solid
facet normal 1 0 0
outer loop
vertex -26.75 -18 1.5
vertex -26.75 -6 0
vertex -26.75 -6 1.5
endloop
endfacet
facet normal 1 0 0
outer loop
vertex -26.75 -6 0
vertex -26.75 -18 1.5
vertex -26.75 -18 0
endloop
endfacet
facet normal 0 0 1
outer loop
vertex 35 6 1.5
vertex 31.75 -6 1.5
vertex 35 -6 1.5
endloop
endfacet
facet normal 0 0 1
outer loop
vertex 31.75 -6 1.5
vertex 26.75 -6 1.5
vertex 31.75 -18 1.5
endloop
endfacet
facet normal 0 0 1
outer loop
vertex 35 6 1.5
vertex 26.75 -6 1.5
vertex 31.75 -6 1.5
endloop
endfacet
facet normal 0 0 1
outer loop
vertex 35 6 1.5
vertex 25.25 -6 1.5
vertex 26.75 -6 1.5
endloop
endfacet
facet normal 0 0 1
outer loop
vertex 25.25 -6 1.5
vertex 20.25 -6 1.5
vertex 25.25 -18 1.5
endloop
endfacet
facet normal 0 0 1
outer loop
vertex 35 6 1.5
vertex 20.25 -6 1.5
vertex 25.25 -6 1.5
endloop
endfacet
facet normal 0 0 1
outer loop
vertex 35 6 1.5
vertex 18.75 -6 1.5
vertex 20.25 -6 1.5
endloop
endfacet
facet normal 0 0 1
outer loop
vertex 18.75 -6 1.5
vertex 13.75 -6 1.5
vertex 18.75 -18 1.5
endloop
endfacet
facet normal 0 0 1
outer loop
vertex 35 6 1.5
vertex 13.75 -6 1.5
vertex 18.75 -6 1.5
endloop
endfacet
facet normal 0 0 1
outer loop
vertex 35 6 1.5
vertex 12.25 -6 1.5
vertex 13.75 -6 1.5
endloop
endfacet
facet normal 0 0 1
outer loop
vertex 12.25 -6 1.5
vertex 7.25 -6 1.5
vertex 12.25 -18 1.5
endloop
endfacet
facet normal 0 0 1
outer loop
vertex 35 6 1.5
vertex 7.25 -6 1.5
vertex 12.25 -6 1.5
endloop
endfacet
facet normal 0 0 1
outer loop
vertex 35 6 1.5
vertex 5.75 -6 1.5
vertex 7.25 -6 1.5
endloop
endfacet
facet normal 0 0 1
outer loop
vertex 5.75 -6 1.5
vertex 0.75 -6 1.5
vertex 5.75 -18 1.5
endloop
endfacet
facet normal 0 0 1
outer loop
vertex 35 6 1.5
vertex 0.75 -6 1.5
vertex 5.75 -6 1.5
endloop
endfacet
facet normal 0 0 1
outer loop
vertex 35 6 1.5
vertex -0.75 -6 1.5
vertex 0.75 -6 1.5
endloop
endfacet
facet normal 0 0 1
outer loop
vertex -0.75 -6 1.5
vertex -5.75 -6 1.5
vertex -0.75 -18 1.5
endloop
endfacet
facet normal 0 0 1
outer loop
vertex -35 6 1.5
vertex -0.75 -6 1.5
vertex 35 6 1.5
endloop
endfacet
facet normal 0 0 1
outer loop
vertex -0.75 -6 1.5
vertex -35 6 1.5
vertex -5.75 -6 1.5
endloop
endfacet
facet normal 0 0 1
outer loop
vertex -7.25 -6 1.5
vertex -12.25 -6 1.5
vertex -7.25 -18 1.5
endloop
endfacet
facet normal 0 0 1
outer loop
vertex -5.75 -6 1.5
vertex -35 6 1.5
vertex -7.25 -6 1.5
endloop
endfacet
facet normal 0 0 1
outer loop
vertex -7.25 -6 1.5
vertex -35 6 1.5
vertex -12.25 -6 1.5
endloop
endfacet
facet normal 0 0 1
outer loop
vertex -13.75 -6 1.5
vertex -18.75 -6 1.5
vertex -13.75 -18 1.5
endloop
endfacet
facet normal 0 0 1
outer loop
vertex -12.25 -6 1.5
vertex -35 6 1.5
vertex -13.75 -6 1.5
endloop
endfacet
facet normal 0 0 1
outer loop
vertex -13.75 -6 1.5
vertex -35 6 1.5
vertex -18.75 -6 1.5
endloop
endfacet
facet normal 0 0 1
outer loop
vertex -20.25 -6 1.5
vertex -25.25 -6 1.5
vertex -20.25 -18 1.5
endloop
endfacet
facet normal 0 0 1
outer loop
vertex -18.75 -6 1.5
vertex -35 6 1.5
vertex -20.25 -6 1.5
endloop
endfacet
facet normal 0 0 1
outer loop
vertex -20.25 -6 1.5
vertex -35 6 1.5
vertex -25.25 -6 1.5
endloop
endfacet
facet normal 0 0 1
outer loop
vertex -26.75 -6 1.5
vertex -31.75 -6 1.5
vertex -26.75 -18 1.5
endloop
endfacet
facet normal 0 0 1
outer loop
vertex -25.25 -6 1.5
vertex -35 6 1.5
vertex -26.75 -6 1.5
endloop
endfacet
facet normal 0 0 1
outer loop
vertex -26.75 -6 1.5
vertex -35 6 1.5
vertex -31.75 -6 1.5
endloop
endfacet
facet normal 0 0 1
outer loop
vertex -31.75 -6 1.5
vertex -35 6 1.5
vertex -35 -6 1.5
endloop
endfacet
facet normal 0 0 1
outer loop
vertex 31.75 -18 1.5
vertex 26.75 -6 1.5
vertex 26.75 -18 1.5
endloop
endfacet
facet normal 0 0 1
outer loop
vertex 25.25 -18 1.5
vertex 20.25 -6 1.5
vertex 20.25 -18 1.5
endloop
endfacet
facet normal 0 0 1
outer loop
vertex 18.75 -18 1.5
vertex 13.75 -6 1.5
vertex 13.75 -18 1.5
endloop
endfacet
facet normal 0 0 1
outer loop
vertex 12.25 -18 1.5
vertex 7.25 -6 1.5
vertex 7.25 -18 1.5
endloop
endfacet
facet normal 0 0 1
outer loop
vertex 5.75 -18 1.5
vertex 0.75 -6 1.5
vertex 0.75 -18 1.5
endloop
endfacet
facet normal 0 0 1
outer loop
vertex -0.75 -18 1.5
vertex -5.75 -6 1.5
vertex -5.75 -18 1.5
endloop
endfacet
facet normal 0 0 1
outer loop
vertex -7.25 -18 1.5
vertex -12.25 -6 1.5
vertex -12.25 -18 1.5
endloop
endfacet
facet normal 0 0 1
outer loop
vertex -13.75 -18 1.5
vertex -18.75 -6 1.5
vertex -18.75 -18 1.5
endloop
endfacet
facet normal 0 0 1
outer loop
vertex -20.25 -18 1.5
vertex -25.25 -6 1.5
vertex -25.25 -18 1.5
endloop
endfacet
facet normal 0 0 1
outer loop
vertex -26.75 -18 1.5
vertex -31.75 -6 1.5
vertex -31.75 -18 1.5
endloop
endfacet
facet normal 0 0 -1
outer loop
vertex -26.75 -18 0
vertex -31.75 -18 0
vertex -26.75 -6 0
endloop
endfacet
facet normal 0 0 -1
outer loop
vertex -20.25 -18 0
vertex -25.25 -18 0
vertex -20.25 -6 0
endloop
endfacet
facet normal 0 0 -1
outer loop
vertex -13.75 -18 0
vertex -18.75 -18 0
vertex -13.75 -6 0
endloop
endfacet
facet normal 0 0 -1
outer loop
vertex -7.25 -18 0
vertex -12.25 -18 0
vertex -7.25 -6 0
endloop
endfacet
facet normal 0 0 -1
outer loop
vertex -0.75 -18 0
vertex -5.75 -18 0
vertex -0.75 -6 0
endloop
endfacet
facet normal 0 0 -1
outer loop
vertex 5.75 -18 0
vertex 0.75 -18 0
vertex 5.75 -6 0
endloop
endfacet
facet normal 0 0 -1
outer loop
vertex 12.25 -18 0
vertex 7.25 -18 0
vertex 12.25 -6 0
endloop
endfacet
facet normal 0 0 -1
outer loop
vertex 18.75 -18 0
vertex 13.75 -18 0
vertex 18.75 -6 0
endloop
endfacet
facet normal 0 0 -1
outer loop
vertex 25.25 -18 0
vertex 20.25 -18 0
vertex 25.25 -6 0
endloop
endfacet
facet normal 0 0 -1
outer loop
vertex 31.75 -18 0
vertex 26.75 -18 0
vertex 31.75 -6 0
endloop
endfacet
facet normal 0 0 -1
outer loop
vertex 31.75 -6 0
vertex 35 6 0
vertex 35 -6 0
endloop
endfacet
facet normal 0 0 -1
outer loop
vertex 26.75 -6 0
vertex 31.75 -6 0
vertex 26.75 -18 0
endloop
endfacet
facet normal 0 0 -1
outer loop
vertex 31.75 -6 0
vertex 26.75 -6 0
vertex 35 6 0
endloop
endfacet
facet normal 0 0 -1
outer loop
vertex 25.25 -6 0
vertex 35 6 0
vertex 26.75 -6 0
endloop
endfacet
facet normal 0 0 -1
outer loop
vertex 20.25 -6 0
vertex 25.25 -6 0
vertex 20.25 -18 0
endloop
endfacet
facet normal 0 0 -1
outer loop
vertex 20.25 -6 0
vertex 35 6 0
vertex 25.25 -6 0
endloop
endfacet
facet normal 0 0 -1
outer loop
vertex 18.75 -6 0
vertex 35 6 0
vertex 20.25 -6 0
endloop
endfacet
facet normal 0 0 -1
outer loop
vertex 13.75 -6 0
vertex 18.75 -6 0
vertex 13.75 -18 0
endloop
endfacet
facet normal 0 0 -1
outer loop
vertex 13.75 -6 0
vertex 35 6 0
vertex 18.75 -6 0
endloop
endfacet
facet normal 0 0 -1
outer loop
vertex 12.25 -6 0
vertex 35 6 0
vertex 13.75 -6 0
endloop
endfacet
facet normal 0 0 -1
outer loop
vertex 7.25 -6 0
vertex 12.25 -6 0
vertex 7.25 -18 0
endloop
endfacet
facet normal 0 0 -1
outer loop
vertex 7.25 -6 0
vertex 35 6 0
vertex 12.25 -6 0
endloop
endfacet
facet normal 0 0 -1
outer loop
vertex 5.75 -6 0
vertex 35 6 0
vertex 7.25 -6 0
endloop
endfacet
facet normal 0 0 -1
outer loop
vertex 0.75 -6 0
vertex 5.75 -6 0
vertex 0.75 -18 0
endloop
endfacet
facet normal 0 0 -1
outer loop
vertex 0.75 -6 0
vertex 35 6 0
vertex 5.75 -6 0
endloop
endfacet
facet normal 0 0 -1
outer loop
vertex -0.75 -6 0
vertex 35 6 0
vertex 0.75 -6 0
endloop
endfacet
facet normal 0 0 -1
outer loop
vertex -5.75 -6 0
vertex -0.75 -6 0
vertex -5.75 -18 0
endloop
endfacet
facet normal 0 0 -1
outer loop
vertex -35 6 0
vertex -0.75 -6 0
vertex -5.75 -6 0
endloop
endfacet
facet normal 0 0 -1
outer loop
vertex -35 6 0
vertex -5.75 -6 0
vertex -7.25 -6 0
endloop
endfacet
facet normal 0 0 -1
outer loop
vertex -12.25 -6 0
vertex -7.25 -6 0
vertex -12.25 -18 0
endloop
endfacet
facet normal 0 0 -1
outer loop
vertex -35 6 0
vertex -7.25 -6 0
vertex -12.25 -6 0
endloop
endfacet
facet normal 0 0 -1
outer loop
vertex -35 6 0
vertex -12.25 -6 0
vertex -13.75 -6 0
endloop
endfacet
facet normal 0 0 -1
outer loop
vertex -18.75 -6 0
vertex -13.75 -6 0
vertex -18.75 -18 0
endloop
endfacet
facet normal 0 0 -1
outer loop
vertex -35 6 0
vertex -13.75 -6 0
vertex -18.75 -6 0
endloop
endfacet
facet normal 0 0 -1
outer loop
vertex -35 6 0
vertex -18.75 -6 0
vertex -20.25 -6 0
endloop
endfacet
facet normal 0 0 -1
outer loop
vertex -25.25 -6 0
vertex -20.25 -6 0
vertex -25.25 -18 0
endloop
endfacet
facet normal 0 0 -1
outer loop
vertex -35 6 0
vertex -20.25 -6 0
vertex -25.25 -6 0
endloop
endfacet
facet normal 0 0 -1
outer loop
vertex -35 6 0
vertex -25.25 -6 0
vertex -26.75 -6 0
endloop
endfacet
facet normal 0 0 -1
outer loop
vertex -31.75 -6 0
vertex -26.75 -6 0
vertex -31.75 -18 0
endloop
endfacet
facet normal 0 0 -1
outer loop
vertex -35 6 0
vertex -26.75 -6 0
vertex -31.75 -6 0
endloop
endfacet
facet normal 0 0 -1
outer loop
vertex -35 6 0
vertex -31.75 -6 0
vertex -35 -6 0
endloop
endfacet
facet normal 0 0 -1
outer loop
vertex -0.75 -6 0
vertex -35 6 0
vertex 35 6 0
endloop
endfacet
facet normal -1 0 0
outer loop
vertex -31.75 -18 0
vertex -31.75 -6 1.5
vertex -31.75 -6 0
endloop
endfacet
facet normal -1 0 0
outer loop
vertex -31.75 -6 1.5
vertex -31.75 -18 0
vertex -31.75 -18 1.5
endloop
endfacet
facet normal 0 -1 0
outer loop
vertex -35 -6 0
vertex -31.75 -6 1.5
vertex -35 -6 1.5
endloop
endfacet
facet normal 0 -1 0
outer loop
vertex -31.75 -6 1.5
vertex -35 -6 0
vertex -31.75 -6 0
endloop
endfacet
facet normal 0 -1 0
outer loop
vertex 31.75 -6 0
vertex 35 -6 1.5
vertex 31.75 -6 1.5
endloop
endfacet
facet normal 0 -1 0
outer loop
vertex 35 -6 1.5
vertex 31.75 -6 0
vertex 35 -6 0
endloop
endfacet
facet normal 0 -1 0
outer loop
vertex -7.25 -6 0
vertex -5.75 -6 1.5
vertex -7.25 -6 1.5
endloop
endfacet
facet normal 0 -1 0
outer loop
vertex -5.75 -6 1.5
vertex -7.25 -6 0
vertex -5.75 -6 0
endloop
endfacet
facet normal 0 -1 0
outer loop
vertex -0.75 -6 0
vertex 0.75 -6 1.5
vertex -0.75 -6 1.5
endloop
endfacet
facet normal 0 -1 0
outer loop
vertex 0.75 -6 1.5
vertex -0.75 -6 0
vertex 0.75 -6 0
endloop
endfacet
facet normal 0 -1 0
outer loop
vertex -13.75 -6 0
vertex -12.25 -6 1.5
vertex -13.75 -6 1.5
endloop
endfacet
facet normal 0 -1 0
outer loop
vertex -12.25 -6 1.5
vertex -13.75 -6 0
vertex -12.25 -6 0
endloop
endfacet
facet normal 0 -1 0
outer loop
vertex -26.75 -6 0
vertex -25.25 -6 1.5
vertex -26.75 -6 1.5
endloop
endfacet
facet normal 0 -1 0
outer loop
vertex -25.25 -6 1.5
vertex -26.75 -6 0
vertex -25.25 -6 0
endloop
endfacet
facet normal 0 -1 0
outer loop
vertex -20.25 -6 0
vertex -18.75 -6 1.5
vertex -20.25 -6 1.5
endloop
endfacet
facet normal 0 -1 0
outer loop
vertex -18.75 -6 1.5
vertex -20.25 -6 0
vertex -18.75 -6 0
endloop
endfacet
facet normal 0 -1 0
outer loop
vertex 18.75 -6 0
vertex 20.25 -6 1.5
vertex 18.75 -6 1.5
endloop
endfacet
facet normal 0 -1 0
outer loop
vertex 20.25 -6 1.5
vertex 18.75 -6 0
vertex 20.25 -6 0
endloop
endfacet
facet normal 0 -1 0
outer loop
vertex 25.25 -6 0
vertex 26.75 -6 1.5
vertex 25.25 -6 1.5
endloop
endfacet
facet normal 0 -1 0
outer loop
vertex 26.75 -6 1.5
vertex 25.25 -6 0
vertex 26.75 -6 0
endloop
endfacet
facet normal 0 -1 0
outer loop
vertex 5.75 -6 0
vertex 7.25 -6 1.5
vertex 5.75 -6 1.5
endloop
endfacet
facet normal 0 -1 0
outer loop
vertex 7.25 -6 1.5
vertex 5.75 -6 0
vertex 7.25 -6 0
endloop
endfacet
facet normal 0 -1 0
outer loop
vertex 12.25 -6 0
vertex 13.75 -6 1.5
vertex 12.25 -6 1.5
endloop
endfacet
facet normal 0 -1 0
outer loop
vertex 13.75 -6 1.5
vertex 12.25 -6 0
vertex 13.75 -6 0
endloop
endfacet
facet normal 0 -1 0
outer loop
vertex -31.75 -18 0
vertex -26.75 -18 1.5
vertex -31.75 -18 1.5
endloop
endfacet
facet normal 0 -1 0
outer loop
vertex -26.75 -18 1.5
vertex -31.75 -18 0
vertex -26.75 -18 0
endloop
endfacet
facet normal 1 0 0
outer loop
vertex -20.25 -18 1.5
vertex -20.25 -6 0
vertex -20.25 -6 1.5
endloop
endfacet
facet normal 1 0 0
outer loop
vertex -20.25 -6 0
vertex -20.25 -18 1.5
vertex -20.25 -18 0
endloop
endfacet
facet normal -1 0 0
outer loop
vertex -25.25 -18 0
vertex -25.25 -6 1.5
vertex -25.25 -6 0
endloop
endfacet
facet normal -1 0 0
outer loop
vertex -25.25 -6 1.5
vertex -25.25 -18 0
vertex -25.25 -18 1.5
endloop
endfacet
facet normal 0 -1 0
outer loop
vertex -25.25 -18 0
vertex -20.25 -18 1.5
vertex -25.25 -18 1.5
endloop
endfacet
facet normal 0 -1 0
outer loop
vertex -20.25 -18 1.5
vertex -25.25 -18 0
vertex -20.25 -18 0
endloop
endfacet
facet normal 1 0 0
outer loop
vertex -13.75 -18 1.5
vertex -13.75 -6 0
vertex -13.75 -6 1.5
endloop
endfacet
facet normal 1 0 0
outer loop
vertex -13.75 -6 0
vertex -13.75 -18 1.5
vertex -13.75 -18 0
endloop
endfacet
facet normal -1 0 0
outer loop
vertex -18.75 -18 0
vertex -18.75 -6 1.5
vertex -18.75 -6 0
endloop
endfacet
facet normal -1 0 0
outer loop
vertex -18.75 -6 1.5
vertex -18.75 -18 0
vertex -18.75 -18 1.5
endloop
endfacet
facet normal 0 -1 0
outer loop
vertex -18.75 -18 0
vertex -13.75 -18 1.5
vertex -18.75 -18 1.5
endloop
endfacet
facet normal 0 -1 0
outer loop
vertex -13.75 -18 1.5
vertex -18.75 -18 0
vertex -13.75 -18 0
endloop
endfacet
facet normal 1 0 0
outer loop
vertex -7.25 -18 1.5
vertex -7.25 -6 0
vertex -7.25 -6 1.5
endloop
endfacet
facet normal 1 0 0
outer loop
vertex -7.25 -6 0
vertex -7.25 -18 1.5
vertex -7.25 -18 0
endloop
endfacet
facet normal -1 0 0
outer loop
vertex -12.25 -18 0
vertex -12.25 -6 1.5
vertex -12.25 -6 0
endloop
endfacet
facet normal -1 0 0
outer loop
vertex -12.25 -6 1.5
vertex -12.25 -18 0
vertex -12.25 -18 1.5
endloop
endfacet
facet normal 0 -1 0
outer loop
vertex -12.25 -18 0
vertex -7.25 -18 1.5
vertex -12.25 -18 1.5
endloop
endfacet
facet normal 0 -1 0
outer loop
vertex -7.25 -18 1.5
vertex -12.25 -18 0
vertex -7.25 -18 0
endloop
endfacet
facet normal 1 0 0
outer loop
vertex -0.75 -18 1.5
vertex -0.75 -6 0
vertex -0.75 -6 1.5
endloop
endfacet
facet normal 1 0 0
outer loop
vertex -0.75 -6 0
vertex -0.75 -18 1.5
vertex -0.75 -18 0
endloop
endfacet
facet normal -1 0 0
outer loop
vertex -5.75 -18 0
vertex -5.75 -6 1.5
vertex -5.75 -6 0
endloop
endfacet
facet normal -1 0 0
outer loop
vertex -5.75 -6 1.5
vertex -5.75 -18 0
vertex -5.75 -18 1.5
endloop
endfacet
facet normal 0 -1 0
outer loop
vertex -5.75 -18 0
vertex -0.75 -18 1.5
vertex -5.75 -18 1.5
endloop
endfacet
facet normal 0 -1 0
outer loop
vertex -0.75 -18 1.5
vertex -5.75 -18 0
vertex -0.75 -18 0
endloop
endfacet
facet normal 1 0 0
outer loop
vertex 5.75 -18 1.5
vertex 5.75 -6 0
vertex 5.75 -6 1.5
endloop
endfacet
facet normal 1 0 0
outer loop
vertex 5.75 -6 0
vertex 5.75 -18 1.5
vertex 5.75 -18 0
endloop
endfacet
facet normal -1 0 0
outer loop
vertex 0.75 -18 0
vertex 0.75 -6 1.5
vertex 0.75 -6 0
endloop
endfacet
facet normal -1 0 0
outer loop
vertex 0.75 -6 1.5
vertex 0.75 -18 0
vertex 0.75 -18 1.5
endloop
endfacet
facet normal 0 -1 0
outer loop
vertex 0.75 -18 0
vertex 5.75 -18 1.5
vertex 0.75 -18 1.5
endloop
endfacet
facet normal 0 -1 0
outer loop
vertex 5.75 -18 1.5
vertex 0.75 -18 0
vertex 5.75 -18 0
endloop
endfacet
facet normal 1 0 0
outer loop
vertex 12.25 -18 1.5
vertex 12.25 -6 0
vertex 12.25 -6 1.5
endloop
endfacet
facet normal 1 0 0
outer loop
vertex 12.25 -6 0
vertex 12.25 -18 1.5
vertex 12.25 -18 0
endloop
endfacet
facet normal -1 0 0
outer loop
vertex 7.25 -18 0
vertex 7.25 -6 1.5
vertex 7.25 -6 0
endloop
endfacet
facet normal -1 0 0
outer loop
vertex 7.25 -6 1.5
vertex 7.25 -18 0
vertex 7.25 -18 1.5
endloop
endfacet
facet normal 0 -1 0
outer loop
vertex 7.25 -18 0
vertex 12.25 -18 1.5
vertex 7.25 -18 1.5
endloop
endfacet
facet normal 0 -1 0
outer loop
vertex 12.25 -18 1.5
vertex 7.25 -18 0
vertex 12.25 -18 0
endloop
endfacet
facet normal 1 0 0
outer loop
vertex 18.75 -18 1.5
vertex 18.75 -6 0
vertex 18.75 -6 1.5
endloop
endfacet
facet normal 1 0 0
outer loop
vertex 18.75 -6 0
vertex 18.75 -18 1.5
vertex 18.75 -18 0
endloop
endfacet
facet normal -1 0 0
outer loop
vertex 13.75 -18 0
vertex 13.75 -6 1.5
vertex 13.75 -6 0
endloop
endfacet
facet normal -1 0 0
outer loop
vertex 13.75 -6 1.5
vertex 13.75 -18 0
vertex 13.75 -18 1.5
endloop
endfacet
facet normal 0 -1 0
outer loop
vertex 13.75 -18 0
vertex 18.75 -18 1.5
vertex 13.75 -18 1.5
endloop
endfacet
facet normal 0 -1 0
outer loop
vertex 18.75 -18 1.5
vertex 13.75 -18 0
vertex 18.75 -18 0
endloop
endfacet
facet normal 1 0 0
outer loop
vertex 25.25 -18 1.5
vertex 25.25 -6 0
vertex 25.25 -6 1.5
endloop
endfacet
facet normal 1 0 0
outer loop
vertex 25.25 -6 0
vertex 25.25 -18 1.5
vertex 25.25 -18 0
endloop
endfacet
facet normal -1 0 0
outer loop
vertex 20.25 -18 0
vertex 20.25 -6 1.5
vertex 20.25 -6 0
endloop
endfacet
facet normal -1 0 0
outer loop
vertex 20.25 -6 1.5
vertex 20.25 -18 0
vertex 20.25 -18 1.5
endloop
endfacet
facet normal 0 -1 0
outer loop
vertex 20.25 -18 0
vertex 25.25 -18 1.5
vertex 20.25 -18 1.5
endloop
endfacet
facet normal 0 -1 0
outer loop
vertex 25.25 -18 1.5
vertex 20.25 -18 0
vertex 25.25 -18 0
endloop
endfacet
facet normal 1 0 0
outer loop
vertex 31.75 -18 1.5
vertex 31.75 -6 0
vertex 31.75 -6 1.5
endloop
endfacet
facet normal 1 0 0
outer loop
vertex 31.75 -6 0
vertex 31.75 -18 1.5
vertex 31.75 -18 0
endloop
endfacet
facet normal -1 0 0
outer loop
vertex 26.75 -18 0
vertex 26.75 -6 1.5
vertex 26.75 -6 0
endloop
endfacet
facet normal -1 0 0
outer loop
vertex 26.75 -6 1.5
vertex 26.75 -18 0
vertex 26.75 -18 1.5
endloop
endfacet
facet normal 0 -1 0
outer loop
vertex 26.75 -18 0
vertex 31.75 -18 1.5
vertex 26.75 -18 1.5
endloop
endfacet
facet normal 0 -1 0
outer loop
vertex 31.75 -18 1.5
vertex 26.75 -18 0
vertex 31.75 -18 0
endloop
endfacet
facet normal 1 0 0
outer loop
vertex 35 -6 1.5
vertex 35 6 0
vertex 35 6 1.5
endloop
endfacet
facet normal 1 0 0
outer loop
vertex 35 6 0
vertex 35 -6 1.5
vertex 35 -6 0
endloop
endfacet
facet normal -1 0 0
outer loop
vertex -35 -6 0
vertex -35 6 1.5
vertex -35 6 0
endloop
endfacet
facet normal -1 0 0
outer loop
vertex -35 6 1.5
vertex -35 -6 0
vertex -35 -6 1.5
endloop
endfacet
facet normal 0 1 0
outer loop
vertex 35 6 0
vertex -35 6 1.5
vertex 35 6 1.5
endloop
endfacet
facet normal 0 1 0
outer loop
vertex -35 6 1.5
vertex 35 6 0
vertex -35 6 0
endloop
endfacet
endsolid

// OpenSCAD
// Parameters (mm)
thickness = 1.5;          // Plate thickness
spine_length = 70;        // Length of the back bar (X)
spine_width = 12;         // Width of the back bar (Y)
tooth_width = 5.0;        // Width of each tooth (X)
tooth_length = 12;        // Length of each tooth (Y)
gap = 1.5;                // Gap between neighbouring teeth (Y)
num_teeth = 10;           // Number of teeth

$fn = 64; // smooth circles/cylinders

// Main module
module agarose_comb() {
    // Spine (back bar) – centered on origin, bottom at Z=0
    translate([-spine_length/2, -spine_width/2, 0])
        cube([spine_length, spine_width, thickness]);

    // Compute total width occupied by teeth + gaps
    total_tooth_row_width = num_teeth*tooth_width + (num_teeth-1)*gap;

    // Generate teeth with a for‑loop
    for (i = [0 : num_teeth-1]) {
        // X position of the centre of the i‑th tooth
        tooth_center_x = -total_tooth_row_width/2 + tooth_width/2 + i*(tooth_width + gap);
        // Y position: front face of tooth aligns with the -Y edge of the spine
        tooth_y = -spine_width/2 - tooth_length;

        translate([tooth_center_x - tooth_width/2,
                   tooth_y,
                   0])
            cube([tooth_width, tooth_length, thickness]);
    }
}

// Assemble the part
agarose_comb();
